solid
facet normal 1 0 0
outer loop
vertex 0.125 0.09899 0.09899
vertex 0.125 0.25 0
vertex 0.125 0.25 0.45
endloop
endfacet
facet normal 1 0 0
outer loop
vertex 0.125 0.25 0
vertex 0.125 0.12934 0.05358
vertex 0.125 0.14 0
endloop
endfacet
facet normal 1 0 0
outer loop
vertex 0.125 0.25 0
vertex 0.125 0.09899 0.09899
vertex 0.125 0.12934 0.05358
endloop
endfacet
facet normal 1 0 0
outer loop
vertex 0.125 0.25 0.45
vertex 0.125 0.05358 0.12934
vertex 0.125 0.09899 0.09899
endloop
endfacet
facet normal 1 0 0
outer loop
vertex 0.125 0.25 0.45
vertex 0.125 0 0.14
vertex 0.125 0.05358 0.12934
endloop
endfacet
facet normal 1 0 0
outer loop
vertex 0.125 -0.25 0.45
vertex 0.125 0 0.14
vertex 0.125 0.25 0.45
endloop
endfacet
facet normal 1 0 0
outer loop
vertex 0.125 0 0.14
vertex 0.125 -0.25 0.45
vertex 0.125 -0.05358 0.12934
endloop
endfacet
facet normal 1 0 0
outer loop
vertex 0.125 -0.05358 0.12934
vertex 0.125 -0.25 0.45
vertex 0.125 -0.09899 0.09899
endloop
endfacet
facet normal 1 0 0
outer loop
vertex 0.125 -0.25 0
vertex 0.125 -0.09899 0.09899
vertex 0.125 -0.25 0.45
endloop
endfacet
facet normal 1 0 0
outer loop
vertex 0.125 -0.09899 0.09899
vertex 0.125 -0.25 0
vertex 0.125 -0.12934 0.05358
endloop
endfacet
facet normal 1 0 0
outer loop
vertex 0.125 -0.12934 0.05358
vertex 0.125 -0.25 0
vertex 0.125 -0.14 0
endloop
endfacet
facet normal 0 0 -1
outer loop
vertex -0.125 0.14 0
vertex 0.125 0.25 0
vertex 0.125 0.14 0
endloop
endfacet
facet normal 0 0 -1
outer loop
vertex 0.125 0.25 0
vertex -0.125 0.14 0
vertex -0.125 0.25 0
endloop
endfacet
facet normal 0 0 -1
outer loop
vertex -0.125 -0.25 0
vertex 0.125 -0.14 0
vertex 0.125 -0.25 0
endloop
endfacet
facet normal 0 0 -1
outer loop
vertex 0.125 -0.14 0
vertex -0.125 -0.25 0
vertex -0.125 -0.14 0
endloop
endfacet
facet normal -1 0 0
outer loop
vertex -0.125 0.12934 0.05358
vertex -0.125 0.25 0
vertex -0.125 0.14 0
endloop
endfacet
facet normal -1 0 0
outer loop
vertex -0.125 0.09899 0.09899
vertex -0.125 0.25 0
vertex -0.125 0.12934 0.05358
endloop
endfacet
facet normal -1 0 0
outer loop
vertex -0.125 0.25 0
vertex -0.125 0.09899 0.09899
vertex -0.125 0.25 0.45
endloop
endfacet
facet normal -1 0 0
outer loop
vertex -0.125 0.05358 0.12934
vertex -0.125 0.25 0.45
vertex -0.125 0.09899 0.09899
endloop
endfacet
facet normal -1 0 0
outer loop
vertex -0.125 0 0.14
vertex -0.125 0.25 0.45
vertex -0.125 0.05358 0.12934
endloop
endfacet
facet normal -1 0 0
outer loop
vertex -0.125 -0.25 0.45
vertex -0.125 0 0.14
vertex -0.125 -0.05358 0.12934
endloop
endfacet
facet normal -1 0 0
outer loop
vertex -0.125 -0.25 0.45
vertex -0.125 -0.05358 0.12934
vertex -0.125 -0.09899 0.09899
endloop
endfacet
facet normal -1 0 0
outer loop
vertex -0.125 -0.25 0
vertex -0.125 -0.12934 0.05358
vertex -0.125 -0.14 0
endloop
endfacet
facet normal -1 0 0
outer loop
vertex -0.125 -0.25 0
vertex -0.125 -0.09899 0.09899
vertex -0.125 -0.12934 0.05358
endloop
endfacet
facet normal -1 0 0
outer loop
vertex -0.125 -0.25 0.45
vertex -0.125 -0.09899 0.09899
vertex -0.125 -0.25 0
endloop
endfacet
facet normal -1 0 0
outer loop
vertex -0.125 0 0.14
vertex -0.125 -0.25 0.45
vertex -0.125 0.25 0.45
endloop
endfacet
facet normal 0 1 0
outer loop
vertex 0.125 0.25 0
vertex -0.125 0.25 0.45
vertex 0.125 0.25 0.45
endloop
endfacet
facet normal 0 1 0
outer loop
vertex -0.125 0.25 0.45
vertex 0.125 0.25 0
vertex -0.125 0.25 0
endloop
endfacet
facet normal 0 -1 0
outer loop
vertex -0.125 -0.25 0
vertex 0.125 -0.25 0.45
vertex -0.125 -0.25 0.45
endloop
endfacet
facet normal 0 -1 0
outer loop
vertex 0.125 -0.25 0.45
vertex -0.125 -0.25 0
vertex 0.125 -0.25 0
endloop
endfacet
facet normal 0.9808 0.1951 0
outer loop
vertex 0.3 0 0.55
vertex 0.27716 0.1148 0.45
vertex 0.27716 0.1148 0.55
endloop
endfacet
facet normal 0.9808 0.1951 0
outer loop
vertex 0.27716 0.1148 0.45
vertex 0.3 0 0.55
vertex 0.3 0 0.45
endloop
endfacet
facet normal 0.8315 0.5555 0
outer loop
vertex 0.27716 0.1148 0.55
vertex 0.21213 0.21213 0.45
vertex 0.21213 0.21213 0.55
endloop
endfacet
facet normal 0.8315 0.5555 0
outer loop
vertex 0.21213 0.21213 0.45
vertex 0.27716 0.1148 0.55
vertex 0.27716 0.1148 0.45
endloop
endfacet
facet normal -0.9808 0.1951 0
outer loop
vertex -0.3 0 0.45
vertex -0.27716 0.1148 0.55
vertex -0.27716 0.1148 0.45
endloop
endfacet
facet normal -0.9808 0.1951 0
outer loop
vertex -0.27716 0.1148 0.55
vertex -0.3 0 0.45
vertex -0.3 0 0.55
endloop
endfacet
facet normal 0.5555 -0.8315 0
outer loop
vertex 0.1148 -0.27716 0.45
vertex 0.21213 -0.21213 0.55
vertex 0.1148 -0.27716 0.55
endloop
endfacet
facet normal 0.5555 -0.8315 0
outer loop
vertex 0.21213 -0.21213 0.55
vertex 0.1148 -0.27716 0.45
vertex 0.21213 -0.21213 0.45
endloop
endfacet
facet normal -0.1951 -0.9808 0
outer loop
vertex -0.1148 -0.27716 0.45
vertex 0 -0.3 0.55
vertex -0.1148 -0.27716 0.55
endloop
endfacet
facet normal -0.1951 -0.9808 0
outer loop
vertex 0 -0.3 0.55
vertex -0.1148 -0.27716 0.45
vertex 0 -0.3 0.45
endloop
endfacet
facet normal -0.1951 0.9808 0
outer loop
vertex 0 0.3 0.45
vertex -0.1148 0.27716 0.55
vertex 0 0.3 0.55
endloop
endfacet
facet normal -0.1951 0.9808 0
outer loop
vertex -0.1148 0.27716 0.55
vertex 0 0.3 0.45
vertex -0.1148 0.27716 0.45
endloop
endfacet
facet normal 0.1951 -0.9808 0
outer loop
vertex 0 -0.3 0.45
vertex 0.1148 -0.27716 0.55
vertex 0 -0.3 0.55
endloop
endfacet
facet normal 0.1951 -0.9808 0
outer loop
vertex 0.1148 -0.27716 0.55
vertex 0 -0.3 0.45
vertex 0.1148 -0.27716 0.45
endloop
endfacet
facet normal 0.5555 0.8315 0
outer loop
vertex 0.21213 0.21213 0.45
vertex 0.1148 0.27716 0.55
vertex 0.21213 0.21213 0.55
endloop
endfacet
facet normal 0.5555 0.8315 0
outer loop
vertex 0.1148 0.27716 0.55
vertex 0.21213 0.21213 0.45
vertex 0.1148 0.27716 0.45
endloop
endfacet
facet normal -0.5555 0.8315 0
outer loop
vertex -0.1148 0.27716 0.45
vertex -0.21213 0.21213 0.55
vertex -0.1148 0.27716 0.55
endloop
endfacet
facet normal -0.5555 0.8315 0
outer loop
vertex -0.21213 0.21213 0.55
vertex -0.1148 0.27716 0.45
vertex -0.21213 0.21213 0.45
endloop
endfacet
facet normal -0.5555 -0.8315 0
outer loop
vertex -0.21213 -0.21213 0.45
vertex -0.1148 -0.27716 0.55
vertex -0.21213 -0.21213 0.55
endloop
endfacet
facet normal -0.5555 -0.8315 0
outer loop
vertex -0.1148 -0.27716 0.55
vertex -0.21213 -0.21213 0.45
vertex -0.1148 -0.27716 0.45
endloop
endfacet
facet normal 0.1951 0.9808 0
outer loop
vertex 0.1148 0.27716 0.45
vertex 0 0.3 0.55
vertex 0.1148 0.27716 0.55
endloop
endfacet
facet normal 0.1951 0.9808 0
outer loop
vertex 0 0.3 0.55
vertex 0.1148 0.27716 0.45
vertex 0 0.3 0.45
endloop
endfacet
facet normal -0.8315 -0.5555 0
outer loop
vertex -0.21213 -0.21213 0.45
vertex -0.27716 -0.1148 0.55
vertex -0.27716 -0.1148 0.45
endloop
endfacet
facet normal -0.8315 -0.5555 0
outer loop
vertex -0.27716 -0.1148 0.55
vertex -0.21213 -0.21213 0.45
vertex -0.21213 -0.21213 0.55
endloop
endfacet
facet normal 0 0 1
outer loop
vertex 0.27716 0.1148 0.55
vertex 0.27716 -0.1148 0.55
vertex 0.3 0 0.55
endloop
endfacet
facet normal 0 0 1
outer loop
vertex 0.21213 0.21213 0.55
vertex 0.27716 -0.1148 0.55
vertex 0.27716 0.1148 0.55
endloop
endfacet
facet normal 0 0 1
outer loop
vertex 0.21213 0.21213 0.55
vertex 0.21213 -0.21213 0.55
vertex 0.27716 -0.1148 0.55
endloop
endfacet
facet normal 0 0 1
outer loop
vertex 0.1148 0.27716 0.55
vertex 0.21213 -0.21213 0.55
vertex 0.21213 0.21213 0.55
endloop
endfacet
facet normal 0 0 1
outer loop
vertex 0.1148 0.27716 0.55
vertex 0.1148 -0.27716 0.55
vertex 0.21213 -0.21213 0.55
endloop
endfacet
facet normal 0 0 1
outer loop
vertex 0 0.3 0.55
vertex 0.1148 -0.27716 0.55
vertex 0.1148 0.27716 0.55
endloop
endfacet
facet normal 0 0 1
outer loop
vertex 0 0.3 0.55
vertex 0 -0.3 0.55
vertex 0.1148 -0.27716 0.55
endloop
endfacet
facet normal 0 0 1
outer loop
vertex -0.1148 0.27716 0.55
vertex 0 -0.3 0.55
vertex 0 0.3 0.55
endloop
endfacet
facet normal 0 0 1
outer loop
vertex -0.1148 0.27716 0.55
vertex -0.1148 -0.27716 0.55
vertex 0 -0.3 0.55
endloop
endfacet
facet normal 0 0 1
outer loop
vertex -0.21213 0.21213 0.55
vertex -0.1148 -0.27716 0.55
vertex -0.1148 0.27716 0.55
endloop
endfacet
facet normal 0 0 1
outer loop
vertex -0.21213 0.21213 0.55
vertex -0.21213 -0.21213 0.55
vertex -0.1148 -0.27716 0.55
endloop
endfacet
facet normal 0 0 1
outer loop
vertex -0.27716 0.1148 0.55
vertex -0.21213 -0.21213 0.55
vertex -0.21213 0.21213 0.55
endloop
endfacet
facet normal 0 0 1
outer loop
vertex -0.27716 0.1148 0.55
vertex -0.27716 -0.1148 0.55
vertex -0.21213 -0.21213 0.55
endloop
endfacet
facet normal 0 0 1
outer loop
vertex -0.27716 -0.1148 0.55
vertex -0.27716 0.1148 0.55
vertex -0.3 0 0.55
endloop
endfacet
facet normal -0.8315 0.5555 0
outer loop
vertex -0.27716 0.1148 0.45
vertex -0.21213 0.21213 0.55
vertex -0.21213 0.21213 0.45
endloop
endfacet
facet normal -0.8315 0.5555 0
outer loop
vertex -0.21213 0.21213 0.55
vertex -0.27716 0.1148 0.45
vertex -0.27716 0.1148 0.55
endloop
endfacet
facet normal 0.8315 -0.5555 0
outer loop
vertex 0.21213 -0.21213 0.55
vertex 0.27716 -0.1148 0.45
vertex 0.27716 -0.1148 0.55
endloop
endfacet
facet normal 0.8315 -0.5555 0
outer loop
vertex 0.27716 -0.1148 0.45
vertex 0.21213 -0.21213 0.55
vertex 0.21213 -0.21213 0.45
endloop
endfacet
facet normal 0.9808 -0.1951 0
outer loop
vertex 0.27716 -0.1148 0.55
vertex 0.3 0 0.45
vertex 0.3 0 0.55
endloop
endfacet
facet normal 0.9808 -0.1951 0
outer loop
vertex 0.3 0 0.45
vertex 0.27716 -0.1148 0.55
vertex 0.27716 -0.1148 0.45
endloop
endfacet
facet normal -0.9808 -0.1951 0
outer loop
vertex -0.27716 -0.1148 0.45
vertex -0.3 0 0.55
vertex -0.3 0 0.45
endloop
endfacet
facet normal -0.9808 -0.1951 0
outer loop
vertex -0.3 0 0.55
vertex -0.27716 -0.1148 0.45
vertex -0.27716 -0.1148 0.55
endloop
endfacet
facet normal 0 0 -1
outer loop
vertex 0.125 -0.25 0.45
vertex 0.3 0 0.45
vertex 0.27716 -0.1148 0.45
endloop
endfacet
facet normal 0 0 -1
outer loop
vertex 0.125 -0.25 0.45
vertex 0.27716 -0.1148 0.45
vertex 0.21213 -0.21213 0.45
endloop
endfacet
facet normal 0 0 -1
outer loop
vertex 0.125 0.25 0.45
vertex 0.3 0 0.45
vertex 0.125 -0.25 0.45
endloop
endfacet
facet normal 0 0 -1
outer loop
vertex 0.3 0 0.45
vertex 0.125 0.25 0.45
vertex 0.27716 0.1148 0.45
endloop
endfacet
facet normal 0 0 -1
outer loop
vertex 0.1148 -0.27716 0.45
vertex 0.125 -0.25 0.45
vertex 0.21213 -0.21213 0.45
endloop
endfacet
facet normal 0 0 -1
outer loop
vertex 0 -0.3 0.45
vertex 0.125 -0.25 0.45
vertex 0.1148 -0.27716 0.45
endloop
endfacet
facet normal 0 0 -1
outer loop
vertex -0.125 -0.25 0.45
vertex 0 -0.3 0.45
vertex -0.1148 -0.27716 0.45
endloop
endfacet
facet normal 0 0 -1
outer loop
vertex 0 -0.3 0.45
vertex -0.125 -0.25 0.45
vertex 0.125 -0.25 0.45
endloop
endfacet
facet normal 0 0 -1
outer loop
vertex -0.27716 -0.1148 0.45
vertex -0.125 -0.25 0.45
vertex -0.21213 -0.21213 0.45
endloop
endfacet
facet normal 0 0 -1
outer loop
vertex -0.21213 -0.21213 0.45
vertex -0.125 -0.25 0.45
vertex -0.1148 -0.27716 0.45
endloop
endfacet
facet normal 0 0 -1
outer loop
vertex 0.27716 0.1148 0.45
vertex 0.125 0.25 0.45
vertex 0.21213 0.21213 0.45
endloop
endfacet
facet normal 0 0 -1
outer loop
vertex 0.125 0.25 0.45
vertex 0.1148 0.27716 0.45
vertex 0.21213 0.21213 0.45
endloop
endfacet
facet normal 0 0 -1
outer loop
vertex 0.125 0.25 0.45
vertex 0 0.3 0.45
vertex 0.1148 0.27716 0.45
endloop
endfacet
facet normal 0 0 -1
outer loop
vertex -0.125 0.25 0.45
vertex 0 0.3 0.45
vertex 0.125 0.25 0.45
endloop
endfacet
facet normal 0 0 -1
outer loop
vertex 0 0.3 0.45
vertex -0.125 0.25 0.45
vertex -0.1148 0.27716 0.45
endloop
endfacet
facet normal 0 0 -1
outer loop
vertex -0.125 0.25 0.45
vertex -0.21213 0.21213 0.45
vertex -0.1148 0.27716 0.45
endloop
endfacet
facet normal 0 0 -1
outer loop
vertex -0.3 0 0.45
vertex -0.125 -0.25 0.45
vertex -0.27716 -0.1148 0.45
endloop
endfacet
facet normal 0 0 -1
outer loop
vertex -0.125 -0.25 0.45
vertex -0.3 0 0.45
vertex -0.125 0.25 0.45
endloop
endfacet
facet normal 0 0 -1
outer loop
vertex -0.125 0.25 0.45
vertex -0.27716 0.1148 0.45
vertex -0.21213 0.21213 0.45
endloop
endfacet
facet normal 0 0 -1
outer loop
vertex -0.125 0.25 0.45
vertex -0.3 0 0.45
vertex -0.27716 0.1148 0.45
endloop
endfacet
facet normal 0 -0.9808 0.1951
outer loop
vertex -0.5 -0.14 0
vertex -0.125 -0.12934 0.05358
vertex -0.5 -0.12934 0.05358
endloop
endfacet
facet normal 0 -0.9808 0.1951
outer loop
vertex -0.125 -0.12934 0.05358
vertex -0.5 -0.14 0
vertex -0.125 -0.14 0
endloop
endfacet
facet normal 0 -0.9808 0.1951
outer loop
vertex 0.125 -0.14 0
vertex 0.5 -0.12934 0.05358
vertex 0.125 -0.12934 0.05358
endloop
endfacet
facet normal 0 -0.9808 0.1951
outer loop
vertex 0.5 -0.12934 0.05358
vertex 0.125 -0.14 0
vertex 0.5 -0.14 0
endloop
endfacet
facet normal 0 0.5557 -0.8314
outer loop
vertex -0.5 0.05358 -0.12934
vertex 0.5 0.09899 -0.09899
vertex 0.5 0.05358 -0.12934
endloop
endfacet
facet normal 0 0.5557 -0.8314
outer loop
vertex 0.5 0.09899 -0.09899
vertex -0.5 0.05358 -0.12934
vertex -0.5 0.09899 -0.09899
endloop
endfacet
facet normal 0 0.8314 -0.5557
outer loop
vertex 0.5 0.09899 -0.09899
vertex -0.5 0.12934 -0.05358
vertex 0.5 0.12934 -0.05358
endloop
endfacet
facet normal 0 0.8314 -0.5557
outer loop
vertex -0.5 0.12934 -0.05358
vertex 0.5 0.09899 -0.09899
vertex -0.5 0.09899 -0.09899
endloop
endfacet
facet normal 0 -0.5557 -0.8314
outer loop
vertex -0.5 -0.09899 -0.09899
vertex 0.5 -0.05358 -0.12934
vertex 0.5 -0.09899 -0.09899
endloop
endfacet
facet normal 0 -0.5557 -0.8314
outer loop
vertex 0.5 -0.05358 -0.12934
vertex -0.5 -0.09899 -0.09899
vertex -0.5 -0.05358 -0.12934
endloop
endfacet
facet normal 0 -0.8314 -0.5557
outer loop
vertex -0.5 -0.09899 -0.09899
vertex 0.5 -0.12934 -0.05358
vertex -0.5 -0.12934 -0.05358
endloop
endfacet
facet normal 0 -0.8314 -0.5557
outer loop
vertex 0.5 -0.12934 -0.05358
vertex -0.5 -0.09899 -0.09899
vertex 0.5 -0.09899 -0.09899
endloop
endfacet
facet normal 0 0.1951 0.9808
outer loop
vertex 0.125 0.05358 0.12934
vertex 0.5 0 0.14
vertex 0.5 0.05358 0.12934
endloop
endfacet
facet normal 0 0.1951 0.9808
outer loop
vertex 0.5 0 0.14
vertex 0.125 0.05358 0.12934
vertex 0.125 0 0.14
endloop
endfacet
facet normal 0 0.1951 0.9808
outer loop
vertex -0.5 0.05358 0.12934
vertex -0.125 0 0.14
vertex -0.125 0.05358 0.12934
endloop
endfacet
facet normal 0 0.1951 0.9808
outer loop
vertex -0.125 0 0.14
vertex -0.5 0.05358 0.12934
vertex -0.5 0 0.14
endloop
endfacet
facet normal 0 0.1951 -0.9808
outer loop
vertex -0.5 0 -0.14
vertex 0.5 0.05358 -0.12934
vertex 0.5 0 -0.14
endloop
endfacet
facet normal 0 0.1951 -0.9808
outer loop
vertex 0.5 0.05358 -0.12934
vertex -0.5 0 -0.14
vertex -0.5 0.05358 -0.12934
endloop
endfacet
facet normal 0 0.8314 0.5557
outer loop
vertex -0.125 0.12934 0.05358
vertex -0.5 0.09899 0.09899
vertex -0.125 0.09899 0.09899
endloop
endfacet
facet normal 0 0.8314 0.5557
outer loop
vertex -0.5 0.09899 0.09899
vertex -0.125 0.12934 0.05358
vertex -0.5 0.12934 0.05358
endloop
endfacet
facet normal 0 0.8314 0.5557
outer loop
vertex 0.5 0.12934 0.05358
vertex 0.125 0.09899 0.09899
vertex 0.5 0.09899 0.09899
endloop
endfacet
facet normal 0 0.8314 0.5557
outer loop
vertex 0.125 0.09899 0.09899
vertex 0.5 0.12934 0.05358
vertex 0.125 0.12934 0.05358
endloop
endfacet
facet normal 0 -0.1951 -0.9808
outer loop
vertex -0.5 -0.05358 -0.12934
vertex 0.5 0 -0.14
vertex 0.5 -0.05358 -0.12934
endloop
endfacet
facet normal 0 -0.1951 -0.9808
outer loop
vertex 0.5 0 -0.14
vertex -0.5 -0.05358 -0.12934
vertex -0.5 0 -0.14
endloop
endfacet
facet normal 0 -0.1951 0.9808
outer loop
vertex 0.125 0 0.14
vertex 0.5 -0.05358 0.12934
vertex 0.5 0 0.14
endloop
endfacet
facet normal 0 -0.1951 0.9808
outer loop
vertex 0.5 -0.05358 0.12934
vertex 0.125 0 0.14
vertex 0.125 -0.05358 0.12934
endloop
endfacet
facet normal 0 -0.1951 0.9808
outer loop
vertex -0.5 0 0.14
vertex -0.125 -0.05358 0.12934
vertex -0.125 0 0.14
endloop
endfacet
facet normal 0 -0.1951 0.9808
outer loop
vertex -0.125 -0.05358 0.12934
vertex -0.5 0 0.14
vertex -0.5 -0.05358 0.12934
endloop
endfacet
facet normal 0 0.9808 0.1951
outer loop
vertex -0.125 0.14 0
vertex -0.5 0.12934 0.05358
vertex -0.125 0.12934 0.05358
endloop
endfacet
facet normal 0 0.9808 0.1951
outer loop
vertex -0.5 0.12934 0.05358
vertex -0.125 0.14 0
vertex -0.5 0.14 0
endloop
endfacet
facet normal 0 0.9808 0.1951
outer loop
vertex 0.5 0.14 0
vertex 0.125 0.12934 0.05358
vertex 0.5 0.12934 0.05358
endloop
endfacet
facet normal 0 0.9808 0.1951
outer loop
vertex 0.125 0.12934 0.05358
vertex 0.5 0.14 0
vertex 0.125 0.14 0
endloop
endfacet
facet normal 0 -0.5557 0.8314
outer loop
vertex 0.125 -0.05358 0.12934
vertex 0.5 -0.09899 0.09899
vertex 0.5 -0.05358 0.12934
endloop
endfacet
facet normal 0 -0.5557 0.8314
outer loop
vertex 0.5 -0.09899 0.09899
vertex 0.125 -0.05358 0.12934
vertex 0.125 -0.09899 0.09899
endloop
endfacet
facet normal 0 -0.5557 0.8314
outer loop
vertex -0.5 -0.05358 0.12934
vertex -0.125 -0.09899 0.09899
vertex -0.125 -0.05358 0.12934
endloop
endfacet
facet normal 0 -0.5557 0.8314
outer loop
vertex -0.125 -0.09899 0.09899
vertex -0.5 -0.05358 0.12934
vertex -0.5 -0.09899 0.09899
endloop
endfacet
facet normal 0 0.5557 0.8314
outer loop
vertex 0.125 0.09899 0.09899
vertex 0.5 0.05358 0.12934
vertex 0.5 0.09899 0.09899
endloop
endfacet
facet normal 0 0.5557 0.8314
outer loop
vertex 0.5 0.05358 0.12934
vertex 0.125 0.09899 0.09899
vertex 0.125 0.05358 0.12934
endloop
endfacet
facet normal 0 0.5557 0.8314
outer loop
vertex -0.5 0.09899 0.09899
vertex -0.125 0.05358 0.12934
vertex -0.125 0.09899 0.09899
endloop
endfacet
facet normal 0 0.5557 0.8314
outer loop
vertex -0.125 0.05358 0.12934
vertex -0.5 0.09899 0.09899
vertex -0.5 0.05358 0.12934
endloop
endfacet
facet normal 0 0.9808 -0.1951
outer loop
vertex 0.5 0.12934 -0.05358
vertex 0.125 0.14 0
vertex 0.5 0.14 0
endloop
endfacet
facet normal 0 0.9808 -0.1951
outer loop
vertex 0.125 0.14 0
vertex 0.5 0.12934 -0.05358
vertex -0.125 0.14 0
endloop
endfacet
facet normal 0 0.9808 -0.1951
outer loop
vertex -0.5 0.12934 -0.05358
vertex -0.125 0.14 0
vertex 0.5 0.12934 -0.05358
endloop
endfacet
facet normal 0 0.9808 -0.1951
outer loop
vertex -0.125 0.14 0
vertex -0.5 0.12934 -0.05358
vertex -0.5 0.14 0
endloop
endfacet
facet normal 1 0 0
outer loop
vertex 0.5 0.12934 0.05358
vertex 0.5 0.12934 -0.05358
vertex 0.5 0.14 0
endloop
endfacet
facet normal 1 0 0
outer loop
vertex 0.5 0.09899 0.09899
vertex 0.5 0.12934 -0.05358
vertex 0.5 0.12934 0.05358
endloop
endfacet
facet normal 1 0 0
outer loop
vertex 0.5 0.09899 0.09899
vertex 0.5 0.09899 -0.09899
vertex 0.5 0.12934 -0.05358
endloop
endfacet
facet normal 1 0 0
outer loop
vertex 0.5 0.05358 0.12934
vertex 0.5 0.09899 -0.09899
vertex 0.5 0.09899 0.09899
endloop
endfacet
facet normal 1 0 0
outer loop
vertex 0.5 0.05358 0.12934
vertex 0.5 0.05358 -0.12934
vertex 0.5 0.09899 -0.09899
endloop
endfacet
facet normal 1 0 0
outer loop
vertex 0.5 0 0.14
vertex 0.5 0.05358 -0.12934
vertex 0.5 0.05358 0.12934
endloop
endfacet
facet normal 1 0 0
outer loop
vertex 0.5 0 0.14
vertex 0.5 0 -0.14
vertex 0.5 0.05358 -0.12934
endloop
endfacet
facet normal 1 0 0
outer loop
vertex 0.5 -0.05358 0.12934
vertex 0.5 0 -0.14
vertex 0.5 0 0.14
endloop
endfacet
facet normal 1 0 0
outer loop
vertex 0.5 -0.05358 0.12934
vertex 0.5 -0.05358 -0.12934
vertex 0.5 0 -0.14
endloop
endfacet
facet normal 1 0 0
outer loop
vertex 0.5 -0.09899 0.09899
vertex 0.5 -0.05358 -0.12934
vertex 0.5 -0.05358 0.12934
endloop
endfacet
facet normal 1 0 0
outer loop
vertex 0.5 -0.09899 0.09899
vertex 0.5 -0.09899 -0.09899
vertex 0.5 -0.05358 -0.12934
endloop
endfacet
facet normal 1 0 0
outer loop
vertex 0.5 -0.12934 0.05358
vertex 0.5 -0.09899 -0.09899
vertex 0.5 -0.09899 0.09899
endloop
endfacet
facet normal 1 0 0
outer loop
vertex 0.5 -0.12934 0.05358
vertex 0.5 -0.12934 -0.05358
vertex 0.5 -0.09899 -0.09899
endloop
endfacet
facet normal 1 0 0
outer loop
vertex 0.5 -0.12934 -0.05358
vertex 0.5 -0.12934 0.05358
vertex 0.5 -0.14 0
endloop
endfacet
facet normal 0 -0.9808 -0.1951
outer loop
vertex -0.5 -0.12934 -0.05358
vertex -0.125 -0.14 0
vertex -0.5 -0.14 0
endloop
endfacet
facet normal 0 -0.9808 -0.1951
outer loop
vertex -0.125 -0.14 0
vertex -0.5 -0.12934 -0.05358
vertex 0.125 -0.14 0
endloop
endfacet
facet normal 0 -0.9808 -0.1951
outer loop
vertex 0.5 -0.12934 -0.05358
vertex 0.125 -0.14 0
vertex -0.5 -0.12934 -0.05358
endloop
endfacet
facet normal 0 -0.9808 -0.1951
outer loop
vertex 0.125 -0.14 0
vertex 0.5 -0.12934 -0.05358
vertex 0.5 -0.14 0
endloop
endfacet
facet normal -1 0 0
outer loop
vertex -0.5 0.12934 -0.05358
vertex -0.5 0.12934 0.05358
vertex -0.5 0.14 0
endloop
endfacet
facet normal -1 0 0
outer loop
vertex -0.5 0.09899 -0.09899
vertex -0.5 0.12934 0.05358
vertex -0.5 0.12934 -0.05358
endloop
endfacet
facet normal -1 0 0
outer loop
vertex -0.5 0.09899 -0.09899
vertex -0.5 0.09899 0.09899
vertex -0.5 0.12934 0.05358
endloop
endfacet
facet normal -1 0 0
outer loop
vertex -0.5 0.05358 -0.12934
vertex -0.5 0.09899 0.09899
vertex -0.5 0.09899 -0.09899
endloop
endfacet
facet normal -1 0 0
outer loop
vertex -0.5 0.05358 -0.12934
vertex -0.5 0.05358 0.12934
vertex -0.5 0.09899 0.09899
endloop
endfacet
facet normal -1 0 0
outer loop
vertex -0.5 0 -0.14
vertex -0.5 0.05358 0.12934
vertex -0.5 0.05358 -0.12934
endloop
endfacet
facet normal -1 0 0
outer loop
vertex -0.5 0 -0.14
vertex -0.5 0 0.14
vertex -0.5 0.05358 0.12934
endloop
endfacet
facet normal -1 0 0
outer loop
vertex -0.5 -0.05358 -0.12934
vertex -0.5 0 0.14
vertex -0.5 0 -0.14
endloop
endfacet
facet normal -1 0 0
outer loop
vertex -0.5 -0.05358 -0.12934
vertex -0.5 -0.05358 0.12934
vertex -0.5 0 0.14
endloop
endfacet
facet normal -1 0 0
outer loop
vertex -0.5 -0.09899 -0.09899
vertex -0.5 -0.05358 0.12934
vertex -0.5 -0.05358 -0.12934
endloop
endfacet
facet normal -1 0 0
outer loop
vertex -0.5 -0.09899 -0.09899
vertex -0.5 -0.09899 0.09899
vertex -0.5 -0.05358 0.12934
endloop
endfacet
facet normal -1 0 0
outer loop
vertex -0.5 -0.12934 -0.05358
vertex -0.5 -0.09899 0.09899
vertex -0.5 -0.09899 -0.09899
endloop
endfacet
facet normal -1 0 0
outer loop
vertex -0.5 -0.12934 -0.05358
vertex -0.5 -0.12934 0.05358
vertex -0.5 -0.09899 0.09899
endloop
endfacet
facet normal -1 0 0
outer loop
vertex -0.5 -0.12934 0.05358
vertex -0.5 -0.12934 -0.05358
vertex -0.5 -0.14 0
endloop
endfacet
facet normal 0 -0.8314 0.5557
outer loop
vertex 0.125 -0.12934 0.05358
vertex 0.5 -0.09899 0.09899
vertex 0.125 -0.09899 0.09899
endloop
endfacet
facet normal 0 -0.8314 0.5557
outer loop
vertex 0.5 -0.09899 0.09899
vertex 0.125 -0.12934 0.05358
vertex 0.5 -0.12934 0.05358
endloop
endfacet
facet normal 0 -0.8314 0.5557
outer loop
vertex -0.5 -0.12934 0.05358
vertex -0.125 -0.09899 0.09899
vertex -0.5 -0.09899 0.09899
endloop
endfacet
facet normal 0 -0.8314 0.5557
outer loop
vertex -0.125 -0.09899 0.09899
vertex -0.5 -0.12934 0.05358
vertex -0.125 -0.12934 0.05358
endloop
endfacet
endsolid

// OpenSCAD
$fn = 16;

//armlink();
gripper()
%base();
%translate([0,0,0.25]) rotbase();
%translate([0,0,1.5]) armlink();
%translate([0,0,4.0]) armlink();
%translate([0,0,6.5]) gripper();

module phalanx() {
    translate([0.0,0,0.25]) cube([0.1,0.2,0.5], center= true);
}

module gripper() {
    translate([0,0,0.25]) cube([0.25,0.5,0.5], center= true);
    
    translate([0,0,0.5]) { 
        cylinder(r=0.3, h=0.1, center = true);
        
        for (i = [0:3]) {
            rotate([0, 0, 120 * i])
                translate([0.4,0,0.0])
                translate([0.0,0,0.25]) {
                %cube([0.1,0.2,0.5], center= true);
            
                translate([0.0,0,0.6])
                    %cube([0.1,0.2,0.5], center= true);
            }
        }
        
    }
    
    rotate([0,90,0]) cylinder(r=0.14, h=1.0, center = true);
}

module bracket() {
    translate([0.0,0.0,0.5])
    rotate([0,90,0])
    difference() {
        hull() {
            cylinder(h=0.25, r=0.25, center= true);
            translate([0.7,0,0.0]) cube([0.5,1,0.25], center= true);
        }
        translate([0.0,0,0.0]) cylinder(h=0.3, r=0.15, center = true);
    }
}

module armlink() {
    translate([0,0,1.0]) {
        cube([0.3,0.5,2.5], center= true);
        
        translate([-0.25,0,1.0]) bracket();
        translate([0.25,0,1.0]) bracket();

    translate([0,0,-1.0]) 
        rotate([0,90,0]) 
        cylinder(r=0.14, h=1.0, center = true);
    }
}

module base() {
    translate([0,0,0.25]) cube([2,2,0.5], center= true);
}

module rotbase() {
        translate([0,0,0.25]) {
            hull() {
                cylinder(h=0.25, r=1.0);
                translate([0,0,0.25]) cube([0.25,0.25,0.25], center= true);
            }
        }

    translate([0,0,0.75]) {
        translate([-0.3,0.0,0.0]) bracket();
        translate([0.3,0.0,0.0]) bracket();
    }
}
